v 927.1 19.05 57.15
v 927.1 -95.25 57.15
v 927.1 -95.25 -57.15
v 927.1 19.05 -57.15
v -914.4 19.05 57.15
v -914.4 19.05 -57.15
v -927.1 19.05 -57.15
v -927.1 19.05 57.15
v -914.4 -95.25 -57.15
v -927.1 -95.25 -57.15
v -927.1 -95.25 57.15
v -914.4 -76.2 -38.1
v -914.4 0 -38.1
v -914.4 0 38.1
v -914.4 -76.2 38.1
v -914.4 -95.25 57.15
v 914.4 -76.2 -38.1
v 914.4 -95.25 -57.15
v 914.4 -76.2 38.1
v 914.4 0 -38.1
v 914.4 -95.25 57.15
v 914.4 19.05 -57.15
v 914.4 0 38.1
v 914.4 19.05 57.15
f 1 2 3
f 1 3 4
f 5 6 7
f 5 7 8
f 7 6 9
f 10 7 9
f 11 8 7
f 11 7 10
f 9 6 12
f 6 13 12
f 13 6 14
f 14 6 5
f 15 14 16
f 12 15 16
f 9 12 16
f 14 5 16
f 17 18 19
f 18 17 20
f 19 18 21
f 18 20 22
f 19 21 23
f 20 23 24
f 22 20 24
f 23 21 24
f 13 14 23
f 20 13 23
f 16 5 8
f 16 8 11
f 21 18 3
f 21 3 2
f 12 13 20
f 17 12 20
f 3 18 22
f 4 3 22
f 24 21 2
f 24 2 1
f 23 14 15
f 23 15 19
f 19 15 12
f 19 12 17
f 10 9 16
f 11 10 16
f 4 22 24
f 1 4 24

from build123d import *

# Parameters (mm, degrees)
F0_W     = 152.4
F0_H     = 152.4
F1_DEPTH = 12.7
F4_W     = 1828.8
F4_H     = 76.2
F5_DEPTH = 76.2
F6_W     = 114.3
F6_H     = 114.3
F6_W_2   = 76.2
F6_H_2   = 76.2
F7_DEPTH = 12.7
F8_W     = 114.3
F8_H     = 114.3
F9_DEPTH = 12.7


with BuildPart() as f1:
    # F0 (on Right) → F1 (new body)
    with BuildSketch(Plane.YZ):
        with Locations((4154.9873268127, -3903.1877601624)):
            Rectangle(F0_W, F0_H)
    extrude(amount=F1_DEPTH)


with BuildPart() as f1_1:
    # F2: moved
    add(f1.part.moved(Location((706.12, -1079.5, 1186.18))))


with BuildPart() as f5:
    # F4 (on Front) → F5 (new body)
    with BuildSketch(Plane.XZ):
        Rectangle(F4_W, F4_H)
    extrude(amount=F5_DEPTH)

    # F6 (on face) → F7 (join)
    with BuildSketch(Plane.YZ.offset(914.4)):
        with Locations((-38.1, 0)):
            Rectangle(F6_W, F6_H)
        with Locations((-38.1, 0)):
            Rectangle(F6_W_2, F6_H_2, mode=Mode.SUBTRACT)
        with Locations((-38.1, 0)):
            Rectangle(F6_W_2, F6_H_2)
    extrude(amount=F7_DEPTH)

    # F8 (on face) → F9 (join)
    with BuildSketch(Plane(origin=(-914.4, 0, 0), x_dir=(0, -1, 0), z_dir=(-1, 0, 0))):
        with Locations((38.1, 0)):
            Rectangle(F8_W, F8_H)
    extrude(amount=F9_DEPTH)


solid = f5.part
